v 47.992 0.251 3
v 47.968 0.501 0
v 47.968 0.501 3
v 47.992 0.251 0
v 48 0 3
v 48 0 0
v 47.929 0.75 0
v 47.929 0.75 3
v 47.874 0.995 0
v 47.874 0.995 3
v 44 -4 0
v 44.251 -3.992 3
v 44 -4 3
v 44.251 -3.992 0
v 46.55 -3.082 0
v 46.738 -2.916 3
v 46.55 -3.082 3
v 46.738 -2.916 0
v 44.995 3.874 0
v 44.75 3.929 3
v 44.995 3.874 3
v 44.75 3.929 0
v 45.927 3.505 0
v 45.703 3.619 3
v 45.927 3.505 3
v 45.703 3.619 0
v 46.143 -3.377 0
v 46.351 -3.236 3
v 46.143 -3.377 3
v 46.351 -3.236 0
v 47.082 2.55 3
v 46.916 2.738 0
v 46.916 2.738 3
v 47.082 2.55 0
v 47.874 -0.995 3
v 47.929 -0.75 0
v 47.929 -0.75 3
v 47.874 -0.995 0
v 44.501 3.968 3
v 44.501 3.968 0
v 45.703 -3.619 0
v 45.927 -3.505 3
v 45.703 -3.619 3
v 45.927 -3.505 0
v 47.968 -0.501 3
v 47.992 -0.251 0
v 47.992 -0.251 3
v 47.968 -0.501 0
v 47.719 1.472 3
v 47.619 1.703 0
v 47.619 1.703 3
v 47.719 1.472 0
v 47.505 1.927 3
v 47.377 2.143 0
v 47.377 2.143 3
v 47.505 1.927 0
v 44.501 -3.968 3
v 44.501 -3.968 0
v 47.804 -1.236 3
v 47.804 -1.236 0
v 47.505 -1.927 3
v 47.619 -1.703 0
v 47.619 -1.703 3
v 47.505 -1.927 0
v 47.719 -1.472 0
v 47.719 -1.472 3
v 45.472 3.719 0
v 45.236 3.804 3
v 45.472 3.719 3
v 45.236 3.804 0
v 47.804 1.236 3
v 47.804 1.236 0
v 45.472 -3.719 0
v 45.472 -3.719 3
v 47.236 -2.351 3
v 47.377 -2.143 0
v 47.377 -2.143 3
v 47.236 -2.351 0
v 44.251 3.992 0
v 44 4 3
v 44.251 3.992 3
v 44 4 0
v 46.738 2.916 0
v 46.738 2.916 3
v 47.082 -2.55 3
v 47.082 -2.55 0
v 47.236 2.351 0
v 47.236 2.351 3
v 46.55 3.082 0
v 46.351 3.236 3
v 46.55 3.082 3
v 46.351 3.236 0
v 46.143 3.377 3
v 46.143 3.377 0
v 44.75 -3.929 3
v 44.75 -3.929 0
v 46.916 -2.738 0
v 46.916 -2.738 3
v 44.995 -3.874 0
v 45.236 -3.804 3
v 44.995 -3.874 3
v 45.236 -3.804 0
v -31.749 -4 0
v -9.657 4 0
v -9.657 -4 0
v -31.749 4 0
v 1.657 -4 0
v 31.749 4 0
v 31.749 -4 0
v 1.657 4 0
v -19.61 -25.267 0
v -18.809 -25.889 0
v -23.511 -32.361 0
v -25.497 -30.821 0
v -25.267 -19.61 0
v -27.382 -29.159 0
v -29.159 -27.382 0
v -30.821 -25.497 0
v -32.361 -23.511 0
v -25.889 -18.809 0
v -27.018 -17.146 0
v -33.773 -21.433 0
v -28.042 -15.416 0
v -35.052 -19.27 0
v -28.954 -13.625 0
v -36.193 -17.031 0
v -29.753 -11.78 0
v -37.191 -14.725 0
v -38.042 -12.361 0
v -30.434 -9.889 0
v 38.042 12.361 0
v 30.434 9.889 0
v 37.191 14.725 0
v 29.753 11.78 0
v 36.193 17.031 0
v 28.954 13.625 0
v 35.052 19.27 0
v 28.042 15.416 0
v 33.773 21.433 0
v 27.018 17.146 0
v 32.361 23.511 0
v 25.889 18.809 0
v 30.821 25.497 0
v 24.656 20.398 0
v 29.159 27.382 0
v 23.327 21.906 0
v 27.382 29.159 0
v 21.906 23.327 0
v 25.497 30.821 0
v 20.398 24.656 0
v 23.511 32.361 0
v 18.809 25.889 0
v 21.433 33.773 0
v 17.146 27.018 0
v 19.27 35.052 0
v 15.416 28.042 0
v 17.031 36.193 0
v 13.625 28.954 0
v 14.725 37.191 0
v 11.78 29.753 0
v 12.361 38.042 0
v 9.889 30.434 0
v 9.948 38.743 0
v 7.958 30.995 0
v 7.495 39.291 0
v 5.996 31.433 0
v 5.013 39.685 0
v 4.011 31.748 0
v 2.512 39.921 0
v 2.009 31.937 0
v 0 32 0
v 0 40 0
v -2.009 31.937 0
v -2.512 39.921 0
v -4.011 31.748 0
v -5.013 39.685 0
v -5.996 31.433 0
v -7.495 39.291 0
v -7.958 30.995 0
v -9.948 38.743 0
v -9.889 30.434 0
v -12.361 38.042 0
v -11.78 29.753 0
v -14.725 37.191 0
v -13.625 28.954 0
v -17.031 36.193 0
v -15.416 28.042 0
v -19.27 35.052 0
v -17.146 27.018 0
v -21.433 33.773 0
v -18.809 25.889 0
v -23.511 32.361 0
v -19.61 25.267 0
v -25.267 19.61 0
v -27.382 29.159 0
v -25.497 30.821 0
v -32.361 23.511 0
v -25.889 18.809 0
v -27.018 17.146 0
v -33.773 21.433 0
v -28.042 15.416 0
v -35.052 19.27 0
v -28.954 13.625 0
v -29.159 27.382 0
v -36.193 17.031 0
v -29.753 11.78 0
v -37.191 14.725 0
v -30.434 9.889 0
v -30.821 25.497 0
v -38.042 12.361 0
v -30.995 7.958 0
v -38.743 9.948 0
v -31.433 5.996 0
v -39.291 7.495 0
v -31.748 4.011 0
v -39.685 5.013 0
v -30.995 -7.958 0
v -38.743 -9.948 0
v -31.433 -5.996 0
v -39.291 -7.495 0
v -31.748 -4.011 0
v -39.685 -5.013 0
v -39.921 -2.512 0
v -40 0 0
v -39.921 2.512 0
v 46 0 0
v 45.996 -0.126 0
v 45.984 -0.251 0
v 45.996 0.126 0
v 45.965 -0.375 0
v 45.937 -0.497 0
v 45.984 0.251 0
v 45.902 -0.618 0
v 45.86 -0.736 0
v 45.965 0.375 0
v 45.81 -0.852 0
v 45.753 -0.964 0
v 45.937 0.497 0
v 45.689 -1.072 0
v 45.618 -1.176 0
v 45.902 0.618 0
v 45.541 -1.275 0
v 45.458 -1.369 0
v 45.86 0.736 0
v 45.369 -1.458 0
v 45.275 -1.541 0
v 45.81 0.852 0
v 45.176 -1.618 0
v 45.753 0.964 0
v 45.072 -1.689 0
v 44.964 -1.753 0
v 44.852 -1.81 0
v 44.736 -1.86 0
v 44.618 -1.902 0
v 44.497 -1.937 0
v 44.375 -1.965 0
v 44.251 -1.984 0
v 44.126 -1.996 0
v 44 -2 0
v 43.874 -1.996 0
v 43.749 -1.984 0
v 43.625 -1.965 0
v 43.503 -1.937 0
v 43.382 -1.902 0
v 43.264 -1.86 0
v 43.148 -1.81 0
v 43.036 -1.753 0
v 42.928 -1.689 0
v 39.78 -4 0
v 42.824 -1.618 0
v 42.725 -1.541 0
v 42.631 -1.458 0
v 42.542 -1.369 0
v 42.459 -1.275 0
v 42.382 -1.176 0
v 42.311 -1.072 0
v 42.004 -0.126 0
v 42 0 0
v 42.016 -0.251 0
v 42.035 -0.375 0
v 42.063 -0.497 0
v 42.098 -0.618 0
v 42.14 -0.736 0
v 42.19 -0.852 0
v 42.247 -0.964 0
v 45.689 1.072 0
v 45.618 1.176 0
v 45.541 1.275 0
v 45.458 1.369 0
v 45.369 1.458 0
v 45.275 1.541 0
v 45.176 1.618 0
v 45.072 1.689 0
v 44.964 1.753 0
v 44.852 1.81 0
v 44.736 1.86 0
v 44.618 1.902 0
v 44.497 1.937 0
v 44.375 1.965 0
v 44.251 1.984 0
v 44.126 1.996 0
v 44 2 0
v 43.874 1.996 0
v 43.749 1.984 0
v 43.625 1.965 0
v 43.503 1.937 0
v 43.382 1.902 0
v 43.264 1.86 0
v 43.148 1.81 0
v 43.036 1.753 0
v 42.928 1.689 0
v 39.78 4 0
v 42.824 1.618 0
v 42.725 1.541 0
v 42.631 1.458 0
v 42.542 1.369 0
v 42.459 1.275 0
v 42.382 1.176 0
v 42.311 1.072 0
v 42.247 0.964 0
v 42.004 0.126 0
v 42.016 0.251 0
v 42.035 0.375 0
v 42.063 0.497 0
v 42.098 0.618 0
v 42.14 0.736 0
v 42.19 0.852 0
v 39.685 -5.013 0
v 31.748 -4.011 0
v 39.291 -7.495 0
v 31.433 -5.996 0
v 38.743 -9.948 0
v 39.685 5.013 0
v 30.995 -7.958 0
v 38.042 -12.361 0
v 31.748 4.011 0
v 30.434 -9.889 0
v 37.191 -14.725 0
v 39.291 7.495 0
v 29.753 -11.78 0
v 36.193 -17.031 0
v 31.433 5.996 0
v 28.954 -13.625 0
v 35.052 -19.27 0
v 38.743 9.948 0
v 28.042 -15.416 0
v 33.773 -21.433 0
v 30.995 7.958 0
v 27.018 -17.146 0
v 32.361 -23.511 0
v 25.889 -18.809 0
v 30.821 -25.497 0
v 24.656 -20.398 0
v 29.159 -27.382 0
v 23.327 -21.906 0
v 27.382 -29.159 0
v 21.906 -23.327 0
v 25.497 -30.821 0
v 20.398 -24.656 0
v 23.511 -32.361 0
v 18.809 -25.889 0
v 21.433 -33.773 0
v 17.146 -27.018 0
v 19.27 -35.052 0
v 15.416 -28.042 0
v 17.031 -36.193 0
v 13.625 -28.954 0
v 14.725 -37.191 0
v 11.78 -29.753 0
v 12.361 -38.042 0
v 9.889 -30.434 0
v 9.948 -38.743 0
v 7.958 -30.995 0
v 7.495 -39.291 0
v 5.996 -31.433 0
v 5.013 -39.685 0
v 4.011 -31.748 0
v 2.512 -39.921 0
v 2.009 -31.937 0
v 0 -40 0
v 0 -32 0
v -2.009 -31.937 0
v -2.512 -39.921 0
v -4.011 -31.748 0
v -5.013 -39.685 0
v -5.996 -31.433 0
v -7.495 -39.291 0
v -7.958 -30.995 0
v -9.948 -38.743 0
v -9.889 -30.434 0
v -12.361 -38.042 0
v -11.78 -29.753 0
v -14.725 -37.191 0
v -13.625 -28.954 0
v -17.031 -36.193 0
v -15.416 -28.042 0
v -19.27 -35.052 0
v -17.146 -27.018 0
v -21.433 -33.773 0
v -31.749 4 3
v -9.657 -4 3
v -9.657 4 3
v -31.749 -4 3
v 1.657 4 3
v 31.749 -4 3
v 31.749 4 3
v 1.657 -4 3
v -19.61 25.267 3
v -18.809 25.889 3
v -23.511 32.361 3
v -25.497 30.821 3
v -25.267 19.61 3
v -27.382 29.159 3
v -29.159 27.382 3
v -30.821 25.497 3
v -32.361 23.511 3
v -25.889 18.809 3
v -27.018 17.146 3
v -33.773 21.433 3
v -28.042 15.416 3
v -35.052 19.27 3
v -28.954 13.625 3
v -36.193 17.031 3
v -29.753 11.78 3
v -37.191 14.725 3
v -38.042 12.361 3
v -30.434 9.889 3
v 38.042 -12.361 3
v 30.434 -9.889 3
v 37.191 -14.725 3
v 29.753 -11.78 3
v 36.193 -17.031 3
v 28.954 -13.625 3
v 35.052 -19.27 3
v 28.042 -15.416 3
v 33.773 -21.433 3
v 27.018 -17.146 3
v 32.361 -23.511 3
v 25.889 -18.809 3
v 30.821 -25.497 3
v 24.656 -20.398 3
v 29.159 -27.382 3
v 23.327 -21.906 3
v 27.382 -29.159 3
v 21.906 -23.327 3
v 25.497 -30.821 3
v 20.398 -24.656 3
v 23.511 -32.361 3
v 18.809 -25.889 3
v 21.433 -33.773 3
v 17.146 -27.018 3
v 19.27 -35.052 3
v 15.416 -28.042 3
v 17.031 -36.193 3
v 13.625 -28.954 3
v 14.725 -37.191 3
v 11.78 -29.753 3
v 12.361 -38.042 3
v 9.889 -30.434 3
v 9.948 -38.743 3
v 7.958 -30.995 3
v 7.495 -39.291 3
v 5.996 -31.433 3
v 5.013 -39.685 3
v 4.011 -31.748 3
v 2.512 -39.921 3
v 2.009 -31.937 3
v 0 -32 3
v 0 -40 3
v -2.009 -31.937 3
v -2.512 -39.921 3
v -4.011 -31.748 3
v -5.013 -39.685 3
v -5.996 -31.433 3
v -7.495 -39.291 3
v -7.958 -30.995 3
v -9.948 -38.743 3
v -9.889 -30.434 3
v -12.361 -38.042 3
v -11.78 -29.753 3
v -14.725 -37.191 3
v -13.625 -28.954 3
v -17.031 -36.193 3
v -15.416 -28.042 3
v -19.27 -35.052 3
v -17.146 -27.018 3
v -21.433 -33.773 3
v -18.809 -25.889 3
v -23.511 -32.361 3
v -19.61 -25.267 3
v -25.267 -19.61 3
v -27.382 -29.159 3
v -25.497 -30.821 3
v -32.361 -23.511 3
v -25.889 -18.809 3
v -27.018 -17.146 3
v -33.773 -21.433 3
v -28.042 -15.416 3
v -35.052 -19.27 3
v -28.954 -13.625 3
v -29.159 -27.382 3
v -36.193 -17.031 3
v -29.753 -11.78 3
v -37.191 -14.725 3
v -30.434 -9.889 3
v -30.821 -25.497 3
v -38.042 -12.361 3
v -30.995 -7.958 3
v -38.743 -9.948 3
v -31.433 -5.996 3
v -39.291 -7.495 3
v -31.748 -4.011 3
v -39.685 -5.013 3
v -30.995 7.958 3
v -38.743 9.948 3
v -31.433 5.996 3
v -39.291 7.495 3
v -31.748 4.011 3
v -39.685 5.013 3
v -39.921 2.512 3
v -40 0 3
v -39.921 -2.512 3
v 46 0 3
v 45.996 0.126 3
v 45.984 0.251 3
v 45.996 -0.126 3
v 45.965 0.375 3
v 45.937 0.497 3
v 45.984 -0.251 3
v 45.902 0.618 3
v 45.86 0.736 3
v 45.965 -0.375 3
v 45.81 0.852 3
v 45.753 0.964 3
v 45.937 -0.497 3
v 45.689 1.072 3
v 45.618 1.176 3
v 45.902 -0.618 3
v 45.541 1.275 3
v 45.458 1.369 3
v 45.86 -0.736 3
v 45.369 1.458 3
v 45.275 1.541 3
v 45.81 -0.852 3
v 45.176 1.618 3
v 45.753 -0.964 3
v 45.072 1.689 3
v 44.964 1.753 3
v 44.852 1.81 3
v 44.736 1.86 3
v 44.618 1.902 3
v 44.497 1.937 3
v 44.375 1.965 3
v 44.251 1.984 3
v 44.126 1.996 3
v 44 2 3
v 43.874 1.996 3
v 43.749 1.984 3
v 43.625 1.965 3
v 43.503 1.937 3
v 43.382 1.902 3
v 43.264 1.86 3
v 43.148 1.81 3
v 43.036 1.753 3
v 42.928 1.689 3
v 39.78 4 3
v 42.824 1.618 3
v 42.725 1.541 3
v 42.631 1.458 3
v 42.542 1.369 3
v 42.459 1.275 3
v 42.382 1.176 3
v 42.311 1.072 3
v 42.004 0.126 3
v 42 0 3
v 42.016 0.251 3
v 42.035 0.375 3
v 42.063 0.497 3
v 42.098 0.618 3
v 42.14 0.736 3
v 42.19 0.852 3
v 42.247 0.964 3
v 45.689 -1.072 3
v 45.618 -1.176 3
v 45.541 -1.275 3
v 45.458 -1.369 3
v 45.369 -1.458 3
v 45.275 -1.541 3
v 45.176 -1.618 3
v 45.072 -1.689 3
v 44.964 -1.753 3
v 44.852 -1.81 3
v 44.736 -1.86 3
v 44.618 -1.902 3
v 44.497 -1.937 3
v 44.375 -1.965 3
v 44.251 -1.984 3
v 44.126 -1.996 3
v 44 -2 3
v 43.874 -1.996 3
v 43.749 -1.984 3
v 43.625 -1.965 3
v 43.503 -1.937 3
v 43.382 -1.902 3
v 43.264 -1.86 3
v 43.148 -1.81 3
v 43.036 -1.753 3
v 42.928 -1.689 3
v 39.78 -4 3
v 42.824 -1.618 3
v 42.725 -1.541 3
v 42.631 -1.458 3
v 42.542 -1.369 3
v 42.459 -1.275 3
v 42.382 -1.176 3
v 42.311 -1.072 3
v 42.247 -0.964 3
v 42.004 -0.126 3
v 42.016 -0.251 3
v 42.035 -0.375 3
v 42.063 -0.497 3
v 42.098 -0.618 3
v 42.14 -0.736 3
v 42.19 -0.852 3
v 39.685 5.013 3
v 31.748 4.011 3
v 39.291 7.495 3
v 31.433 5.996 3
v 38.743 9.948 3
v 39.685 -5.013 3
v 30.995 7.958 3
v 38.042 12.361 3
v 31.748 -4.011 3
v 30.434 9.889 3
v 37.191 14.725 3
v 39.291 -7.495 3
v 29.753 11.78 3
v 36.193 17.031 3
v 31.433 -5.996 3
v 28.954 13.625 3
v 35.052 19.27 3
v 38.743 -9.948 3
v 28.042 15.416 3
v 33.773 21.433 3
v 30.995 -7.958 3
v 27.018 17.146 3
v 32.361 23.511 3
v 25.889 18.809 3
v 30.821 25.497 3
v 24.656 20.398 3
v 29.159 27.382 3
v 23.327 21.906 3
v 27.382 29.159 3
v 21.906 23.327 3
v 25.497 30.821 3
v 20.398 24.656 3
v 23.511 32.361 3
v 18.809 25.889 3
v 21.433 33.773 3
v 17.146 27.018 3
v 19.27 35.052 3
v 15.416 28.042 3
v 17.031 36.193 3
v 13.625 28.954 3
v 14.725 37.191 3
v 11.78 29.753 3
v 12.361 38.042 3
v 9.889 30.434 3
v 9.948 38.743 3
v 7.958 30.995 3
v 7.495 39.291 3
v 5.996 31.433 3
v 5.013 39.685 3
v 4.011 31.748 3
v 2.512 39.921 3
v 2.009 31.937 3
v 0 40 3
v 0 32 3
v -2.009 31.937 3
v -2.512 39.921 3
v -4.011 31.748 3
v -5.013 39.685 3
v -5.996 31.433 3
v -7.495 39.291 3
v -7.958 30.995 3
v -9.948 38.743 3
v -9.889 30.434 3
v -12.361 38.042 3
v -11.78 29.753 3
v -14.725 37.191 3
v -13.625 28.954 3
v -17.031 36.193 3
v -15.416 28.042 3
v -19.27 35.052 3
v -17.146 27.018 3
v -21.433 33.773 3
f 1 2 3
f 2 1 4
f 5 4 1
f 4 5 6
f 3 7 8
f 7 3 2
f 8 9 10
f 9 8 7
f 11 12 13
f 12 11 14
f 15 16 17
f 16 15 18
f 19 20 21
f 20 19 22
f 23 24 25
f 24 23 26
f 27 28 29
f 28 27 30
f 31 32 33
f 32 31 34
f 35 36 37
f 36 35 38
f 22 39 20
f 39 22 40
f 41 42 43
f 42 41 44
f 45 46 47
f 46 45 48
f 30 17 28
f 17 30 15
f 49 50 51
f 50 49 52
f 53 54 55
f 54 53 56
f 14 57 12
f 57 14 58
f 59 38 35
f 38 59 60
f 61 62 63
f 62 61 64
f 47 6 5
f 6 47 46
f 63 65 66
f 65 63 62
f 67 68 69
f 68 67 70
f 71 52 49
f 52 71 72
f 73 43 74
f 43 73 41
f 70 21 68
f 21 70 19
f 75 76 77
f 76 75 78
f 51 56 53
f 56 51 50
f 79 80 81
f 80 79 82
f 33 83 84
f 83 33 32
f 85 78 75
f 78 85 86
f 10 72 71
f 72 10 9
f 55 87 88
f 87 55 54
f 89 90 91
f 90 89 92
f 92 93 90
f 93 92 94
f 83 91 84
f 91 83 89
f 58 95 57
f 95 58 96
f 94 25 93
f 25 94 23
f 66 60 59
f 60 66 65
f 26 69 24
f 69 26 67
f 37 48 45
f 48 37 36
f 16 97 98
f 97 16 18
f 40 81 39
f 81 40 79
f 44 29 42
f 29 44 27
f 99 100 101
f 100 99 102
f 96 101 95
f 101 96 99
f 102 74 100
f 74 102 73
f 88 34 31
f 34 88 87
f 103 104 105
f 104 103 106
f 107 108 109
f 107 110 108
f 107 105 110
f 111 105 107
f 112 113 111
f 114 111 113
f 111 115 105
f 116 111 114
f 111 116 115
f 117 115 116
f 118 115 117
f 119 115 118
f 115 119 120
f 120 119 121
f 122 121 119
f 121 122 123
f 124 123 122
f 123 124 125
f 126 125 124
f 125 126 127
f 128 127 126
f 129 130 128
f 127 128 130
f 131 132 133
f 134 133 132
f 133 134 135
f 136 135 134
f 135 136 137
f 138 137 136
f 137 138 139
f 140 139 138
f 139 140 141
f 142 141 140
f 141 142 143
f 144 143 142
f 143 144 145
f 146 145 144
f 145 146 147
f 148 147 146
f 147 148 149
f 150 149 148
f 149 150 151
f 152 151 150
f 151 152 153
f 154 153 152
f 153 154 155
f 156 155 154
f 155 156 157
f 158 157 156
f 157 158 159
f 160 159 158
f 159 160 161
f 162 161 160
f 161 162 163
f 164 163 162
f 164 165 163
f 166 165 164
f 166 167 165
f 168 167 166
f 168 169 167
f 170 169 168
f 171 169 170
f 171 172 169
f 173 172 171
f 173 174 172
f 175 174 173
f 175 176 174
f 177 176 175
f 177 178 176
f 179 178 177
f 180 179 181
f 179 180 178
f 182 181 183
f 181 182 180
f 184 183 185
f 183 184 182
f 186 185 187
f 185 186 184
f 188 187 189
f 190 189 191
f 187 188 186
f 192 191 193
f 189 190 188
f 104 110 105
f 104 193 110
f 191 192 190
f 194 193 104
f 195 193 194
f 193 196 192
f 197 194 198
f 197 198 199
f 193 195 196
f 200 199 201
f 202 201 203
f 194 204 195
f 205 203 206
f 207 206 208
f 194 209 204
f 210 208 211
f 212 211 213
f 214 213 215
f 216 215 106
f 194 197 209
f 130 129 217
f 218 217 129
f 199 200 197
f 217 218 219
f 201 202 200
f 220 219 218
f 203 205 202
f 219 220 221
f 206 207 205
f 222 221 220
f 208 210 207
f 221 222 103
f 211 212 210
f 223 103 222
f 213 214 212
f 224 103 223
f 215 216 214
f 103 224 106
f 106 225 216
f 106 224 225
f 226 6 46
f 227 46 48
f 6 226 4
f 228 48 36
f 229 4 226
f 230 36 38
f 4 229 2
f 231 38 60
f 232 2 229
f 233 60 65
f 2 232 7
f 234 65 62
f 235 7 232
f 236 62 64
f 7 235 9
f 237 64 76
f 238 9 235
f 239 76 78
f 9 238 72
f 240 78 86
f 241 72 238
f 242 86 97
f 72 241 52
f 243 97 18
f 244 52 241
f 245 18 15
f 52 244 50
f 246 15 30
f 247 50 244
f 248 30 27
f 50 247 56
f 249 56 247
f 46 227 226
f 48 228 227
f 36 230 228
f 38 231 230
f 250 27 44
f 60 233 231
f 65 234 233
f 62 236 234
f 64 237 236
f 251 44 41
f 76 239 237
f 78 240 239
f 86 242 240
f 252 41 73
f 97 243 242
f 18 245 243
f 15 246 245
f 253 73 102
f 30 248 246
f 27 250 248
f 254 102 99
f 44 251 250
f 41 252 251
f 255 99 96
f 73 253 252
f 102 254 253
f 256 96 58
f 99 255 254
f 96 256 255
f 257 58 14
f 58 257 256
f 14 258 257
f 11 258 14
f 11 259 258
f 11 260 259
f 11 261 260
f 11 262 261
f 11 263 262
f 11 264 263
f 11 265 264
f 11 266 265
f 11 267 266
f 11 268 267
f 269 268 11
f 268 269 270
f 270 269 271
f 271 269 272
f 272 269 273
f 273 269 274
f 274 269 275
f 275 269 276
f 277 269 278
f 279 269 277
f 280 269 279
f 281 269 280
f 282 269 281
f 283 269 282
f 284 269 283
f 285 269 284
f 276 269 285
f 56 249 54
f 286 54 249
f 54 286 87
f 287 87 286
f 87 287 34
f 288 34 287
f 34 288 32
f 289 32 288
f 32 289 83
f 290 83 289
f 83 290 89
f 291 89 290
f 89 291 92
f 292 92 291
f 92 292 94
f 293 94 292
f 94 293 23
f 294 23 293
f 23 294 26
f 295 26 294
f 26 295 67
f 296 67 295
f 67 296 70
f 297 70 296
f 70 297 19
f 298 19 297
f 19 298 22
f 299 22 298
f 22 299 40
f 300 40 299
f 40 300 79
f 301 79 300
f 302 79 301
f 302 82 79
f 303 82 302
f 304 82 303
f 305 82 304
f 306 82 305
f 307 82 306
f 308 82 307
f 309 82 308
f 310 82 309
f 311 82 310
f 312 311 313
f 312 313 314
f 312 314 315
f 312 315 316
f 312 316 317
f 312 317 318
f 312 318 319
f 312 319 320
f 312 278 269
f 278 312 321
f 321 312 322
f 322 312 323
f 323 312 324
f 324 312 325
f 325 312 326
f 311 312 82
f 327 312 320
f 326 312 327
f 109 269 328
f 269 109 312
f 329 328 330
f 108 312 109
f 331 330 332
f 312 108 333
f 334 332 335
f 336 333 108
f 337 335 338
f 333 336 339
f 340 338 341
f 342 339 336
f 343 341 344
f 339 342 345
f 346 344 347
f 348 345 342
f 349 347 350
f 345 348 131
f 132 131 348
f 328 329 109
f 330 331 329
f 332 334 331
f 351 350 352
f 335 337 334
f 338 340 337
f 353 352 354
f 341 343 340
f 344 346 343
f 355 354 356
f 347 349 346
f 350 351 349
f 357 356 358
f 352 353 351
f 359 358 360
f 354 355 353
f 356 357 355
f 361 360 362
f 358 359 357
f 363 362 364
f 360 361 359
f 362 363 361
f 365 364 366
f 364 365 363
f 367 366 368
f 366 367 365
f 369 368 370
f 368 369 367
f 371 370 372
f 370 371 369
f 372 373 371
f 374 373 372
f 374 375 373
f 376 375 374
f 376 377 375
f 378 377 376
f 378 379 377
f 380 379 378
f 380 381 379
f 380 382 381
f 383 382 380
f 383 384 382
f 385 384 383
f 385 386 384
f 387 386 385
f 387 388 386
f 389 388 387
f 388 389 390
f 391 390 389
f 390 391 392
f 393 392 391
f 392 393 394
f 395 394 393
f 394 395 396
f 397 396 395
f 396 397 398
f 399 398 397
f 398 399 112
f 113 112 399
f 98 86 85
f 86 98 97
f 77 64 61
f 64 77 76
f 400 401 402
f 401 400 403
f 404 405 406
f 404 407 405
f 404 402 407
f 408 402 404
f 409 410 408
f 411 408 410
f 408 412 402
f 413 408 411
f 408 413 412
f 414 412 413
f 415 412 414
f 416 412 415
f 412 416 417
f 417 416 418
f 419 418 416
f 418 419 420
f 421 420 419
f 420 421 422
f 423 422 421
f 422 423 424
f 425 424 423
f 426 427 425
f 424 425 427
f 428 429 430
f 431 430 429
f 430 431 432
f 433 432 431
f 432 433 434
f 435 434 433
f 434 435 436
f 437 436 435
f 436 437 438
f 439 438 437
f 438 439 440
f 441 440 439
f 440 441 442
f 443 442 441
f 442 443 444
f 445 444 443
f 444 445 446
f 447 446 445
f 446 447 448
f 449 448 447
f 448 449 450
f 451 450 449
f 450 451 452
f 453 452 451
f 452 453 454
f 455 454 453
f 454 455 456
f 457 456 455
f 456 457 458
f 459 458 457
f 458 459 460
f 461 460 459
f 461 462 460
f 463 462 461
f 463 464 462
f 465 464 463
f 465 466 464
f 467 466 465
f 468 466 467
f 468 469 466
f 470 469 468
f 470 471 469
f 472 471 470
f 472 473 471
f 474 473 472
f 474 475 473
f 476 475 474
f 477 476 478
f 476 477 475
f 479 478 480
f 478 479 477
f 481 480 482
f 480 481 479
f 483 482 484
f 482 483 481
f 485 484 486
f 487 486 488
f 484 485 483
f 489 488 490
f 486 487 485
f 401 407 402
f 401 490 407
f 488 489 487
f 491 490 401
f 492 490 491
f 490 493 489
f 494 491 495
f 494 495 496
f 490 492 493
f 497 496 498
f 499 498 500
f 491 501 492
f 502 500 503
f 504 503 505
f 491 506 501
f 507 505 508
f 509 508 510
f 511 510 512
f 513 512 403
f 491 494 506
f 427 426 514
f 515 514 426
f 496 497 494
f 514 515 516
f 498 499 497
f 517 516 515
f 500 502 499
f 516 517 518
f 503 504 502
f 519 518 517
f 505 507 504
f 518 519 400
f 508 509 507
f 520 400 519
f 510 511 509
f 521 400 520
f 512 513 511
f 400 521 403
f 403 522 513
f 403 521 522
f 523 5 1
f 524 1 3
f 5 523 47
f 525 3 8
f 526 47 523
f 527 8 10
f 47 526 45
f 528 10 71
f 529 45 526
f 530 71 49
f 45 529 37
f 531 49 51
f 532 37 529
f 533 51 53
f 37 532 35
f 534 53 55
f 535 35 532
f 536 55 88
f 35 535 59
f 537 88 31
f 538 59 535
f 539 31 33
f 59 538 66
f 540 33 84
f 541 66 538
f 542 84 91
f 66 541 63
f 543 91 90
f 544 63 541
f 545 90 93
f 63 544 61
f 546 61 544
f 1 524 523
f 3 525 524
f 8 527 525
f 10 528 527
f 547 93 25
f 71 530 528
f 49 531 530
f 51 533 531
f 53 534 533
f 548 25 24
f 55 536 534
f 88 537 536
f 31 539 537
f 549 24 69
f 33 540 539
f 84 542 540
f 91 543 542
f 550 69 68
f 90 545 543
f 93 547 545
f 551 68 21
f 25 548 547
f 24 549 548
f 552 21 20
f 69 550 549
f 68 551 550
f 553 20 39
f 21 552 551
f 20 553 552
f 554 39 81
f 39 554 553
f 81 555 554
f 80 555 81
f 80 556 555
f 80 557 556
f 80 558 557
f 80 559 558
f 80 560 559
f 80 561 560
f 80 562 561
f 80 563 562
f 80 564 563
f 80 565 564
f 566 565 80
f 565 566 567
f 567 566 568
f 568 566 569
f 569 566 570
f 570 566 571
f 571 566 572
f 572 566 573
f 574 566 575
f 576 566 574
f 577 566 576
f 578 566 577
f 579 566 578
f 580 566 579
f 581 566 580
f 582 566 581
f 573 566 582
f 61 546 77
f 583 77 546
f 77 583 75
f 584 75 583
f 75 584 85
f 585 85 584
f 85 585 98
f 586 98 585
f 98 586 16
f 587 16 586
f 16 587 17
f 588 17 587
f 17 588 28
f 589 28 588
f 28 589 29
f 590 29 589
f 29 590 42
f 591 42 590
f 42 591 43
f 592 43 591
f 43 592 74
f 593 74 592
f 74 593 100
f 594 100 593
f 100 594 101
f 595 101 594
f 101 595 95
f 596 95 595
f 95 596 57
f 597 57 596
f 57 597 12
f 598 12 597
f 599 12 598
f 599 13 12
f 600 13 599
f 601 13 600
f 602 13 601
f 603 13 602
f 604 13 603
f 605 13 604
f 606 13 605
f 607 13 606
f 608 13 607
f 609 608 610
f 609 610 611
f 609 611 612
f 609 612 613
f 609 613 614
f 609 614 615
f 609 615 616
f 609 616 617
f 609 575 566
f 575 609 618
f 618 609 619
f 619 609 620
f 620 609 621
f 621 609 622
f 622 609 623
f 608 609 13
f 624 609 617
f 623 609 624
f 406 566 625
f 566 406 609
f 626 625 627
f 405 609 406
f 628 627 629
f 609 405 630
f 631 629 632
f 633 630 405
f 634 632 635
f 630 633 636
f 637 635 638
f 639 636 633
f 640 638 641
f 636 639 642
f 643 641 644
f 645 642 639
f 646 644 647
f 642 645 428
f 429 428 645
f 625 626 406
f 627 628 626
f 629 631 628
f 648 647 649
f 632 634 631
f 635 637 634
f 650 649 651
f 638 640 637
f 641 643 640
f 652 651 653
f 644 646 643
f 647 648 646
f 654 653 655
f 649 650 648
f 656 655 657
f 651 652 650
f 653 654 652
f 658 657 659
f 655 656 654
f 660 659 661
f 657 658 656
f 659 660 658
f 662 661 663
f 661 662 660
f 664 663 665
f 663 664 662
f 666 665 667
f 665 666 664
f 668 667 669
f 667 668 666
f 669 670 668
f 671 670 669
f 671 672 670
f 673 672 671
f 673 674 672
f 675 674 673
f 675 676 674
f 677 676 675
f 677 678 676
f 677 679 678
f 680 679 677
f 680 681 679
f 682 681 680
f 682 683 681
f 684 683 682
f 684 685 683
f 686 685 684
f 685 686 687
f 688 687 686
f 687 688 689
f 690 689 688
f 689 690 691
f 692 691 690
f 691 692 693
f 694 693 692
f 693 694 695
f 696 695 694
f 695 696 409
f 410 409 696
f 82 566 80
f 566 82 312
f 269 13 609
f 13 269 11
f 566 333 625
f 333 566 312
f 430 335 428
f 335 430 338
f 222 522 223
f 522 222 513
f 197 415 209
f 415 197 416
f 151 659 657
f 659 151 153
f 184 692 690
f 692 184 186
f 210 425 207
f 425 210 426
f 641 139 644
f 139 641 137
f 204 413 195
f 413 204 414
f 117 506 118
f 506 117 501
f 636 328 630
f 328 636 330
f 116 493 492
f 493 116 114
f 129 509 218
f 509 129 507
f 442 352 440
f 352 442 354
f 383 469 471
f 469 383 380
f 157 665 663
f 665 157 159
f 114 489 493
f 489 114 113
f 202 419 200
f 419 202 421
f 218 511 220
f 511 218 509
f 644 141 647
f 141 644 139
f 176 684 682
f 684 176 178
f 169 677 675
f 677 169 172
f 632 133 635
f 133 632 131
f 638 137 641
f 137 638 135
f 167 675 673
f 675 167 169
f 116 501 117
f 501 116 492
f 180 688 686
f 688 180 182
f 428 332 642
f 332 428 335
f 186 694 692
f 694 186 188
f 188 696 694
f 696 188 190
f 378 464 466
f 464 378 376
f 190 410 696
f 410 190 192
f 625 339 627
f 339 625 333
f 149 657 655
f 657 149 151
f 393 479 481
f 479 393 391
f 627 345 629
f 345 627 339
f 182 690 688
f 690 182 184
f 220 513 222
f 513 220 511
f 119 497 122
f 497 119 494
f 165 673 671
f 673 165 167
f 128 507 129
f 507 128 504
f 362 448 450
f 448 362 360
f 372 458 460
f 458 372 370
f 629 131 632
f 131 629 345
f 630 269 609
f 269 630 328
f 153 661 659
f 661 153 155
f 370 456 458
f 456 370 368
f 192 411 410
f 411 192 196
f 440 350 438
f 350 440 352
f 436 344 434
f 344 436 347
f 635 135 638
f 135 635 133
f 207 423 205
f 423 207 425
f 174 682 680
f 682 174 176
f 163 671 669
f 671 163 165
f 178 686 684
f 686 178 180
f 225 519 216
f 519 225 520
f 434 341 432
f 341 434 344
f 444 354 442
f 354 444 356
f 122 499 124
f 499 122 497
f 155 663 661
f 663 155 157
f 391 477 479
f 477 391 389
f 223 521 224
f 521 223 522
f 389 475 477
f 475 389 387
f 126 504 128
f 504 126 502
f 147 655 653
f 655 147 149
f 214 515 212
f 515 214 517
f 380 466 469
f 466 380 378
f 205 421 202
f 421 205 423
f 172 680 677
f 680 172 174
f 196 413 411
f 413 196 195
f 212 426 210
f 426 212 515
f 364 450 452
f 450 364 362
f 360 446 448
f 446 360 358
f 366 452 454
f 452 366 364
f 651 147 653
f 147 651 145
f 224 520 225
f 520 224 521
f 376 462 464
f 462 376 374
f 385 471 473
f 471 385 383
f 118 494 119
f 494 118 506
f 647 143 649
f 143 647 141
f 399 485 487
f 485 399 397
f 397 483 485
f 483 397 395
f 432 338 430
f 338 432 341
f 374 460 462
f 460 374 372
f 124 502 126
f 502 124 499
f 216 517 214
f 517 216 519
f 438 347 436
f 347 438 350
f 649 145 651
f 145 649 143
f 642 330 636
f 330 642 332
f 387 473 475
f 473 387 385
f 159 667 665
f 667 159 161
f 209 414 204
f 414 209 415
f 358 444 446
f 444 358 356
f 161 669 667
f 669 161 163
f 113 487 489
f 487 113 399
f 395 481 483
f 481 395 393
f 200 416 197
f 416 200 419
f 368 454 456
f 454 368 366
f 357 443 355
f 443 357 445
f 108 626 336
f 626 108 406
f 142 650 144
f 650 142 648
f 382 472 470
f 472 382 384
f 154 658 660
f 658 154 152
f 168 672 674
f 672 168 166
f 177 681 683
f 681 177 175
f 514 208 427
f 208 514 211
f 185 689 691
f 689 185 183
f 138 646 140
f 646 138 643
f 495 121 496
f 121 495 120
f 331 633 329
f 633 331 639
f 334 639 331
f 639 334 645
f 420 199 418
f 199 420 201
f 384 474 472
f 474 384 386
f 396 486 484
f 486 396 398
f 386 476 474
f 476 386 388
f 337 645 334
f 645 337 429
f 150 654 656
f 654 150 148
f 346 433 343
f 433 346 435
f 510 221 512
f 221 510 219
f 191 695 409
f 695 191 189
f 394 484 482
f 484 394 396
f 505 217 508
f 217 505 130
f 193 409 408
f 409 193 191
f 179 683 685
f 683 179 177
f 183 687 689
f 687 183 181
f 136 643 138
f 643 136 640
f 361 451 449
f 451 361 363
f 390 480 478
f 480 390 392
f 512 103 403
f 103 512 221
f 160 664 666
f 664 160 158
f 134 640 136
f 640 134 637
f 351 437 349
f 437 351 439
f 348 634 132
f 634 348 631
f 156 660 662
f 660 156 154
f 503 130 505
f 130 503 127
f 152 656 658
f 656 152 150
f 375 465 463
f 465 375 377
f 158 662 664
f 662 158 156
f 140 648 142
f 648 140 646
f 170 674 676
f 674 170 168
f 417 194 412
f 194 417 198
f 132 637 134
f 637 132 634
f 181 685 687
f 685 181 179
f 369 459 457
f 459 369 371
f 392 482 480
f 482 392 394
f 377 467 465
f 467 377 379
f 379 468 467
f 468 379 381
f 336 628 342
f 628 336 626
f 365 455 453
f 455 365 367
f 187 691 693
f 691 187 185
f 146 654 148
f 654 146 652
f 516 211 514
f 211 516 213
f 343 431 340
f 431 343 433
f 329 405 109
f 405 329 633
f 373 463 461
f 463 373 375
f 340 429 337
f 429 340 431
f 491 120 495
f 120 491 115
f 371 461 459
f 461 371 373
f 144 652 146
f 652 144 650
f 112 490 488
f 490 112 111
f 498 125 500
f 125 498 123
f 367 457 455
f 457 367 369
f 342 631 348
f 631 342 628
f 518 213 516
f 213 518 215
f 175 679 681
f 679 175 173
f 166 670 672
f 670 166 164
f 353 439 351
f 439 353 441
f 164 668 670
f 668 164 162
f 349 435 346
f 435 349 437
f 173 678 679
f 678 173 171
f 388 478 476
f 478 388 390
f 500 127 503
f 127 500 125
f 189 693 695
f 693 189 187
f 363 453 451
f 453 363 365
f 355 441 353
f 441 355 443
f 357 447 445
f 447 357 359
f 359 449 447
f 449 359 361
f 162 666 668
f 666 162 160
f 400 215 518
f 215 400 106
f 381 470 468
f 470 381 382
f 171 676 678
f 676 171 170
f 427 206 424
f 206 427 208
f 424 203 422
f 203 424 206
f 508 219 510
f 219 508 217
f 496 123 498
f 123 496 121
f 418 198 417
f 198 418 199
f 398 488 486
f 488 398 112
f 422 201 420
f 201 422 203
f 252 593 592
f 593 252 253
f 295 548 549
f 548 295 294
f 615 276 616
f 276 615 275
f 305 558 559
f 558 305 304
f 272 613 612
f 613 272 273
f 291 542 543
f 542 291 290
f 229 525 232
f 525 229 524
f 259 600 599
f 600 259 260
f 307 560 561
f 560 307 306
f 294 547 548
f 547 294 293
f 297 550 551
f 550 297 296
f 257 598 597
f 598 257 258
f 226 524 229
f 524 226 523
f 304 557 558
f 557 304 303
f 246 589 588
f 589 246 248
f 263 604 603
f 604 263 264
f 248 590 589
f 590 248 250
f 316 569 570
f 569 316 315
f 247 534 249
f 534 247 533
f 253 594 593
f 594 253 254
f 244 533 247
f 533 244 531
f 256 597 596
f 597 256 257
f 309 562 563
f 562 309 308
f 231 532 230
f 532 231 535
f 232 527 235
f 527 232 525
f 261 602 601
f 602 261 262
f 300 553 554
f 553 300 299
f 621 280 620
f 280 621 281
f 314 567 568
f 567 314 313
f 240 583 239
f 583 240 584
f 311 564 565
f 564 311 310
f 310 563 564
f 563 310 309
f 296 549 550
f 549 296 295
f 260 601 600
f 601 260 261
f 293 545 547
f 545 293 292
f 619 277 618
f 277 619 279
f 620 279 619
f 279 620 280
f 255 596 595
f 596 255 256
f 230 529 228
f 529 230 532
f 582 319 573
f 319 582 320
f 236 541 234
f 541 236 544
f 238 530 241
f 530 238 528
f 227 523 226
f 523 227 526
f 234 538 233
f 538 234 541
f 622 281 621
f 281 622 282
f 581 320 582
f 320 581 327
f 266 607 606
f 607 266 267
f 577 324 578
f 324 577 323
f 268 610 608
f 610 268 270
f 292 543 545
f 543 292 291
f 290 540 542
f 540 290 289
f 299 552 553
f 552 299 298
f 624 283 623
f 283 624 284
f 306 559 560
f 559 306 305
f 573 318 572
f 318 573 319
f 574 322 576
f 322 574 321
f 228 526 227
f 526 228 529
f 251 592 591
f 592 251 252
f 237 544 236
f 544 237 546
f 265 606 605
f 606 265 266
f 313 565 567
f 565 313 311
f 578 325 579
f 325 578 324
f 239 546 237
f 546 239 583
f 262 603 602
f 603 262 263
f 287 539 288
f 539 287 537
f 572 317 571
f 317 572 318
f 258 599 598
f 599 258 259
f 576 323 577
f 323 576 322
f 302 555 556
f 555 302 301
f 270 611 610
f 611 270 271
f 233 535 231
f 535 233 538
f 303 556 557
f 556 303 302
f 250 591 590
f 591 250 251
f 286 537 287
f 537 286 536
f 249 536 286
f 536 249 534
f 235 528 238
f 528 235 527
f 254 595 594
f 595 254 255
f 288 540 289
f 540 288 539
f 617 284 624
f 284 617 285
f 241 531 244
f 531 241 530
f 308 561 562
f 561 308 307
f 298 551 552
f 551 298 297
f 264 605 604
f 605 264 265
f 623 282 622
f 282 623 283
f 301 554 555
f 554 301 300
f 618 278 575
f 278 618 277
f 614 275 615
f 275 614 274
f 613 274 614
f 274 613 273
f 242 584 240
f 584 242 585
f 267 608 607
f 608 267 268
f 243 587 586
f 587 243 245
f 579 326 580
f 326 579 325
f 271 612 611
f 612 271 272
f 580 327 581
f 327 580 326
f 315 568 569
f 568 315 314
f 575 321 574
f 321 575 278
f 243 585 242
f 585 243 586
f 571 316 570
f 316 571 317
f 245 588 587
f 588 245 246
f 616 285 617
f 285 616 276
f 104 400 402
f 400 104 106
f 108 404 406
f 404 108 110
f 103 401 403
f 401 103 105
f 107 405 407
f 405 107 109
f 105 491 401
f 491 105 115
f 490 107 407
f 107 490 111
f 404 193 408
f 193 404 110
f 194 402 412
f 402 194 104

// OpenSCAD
// Copyright 2019 Marcos Del Sol Vives
// SPDX-License-Identifier: ISC

$fn = 100;

height = 3;

outer_diam = 80;

line_width = 8;

hole_inner_diam = 4;
hole_outer_diam = 8;

inner_diam = outer_diam - 2 * line_width;

difference() {
	union() {
		translate([outer_diam / 2 + hole_outer_diam / 2, 0, 0])
			cylinder(d = hole_outer_diam, h = height);
		translate([0, -hole_outer_diam / 2, 0])
			cube([outer_diam / 2 + hole_outer_diam / 2, hole_outer_diam, height]);
		cylinder(d = outer_diam, h = height);
	}

	cylinder(d = inner_diam, h = height);
	translate([outer_diam / 2 + hole_outer_diam / 2, 0, 0])
		cylinder(d = hole_inner_diam, h = height);
}


translate([-inner_diam / 2, -line_width / 2, 0])
	cube([inner_diam, line_width, height]);

rotate([0, 0, -135])
	translate([0, -line_width / 2, 0])
		cube([inner_diam / 2, line_width, height]);

rotate([0, 0, 135])
	translate([0, -line_width / 2, 0])
		cube([inner_diam / 2, line_width, height]);
